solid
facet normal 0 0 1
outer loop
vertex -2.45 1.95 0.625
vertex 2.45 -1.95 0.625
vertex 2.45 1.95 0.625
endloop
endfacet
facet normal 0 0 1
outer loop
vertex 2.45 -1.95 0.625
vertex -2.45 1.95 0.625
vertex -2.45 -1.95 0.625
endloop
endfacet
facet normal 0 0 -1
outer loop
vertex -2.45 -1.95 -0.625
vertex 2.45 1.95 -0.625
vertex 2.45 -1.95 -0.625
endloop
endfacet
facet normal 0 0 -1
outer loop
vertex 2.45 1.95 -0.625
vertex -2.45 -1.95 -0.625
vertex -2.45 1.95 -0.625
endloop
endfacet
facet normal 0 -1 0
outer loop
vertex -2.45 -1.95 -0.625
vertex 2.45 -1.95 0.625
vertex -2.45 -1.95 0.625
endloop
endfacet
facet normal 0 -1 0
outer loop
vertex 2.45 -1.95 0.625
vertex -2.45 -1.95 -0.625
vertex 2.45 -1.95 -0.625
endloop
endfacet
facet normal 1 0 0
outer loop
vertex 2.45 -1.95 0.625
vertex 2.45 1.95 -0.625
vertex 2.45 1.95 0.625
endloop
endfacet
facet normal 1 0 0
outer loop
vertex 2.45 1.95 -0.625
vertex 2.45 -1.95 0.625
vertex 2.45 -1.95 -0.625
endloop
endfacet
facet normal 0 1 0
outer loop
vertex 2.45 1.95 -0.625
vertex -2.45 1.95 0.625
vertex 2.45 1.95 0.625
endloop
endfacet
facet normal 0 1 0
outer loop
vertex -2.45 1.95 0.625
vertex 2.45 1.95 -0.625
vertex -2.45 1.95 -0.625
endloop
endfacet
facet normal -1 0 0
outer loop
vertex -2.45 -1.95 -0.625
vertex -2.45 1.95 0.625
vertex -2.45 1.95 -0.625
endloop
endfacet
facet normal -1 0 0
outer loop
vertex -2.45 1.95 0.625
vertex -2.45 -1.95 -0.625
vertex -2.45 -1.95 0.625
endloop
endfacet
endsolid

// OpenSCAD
// Parameters
body_length = 4.9; //[2.45:9.8:0.05]
body_width = 3.9; //[1.95:7.8:0.05]
body_height = 1.25; //[0.6:2.5:0.05]

// SMD Package Module
module smd_package() {
  color([0.85, 0.85, 0.8]) // Off-white for SMD package
  translate([0, 0, 0])
    cube([body_length, body_width, body_height], center=true);
}

// Final Output
smd_package();
